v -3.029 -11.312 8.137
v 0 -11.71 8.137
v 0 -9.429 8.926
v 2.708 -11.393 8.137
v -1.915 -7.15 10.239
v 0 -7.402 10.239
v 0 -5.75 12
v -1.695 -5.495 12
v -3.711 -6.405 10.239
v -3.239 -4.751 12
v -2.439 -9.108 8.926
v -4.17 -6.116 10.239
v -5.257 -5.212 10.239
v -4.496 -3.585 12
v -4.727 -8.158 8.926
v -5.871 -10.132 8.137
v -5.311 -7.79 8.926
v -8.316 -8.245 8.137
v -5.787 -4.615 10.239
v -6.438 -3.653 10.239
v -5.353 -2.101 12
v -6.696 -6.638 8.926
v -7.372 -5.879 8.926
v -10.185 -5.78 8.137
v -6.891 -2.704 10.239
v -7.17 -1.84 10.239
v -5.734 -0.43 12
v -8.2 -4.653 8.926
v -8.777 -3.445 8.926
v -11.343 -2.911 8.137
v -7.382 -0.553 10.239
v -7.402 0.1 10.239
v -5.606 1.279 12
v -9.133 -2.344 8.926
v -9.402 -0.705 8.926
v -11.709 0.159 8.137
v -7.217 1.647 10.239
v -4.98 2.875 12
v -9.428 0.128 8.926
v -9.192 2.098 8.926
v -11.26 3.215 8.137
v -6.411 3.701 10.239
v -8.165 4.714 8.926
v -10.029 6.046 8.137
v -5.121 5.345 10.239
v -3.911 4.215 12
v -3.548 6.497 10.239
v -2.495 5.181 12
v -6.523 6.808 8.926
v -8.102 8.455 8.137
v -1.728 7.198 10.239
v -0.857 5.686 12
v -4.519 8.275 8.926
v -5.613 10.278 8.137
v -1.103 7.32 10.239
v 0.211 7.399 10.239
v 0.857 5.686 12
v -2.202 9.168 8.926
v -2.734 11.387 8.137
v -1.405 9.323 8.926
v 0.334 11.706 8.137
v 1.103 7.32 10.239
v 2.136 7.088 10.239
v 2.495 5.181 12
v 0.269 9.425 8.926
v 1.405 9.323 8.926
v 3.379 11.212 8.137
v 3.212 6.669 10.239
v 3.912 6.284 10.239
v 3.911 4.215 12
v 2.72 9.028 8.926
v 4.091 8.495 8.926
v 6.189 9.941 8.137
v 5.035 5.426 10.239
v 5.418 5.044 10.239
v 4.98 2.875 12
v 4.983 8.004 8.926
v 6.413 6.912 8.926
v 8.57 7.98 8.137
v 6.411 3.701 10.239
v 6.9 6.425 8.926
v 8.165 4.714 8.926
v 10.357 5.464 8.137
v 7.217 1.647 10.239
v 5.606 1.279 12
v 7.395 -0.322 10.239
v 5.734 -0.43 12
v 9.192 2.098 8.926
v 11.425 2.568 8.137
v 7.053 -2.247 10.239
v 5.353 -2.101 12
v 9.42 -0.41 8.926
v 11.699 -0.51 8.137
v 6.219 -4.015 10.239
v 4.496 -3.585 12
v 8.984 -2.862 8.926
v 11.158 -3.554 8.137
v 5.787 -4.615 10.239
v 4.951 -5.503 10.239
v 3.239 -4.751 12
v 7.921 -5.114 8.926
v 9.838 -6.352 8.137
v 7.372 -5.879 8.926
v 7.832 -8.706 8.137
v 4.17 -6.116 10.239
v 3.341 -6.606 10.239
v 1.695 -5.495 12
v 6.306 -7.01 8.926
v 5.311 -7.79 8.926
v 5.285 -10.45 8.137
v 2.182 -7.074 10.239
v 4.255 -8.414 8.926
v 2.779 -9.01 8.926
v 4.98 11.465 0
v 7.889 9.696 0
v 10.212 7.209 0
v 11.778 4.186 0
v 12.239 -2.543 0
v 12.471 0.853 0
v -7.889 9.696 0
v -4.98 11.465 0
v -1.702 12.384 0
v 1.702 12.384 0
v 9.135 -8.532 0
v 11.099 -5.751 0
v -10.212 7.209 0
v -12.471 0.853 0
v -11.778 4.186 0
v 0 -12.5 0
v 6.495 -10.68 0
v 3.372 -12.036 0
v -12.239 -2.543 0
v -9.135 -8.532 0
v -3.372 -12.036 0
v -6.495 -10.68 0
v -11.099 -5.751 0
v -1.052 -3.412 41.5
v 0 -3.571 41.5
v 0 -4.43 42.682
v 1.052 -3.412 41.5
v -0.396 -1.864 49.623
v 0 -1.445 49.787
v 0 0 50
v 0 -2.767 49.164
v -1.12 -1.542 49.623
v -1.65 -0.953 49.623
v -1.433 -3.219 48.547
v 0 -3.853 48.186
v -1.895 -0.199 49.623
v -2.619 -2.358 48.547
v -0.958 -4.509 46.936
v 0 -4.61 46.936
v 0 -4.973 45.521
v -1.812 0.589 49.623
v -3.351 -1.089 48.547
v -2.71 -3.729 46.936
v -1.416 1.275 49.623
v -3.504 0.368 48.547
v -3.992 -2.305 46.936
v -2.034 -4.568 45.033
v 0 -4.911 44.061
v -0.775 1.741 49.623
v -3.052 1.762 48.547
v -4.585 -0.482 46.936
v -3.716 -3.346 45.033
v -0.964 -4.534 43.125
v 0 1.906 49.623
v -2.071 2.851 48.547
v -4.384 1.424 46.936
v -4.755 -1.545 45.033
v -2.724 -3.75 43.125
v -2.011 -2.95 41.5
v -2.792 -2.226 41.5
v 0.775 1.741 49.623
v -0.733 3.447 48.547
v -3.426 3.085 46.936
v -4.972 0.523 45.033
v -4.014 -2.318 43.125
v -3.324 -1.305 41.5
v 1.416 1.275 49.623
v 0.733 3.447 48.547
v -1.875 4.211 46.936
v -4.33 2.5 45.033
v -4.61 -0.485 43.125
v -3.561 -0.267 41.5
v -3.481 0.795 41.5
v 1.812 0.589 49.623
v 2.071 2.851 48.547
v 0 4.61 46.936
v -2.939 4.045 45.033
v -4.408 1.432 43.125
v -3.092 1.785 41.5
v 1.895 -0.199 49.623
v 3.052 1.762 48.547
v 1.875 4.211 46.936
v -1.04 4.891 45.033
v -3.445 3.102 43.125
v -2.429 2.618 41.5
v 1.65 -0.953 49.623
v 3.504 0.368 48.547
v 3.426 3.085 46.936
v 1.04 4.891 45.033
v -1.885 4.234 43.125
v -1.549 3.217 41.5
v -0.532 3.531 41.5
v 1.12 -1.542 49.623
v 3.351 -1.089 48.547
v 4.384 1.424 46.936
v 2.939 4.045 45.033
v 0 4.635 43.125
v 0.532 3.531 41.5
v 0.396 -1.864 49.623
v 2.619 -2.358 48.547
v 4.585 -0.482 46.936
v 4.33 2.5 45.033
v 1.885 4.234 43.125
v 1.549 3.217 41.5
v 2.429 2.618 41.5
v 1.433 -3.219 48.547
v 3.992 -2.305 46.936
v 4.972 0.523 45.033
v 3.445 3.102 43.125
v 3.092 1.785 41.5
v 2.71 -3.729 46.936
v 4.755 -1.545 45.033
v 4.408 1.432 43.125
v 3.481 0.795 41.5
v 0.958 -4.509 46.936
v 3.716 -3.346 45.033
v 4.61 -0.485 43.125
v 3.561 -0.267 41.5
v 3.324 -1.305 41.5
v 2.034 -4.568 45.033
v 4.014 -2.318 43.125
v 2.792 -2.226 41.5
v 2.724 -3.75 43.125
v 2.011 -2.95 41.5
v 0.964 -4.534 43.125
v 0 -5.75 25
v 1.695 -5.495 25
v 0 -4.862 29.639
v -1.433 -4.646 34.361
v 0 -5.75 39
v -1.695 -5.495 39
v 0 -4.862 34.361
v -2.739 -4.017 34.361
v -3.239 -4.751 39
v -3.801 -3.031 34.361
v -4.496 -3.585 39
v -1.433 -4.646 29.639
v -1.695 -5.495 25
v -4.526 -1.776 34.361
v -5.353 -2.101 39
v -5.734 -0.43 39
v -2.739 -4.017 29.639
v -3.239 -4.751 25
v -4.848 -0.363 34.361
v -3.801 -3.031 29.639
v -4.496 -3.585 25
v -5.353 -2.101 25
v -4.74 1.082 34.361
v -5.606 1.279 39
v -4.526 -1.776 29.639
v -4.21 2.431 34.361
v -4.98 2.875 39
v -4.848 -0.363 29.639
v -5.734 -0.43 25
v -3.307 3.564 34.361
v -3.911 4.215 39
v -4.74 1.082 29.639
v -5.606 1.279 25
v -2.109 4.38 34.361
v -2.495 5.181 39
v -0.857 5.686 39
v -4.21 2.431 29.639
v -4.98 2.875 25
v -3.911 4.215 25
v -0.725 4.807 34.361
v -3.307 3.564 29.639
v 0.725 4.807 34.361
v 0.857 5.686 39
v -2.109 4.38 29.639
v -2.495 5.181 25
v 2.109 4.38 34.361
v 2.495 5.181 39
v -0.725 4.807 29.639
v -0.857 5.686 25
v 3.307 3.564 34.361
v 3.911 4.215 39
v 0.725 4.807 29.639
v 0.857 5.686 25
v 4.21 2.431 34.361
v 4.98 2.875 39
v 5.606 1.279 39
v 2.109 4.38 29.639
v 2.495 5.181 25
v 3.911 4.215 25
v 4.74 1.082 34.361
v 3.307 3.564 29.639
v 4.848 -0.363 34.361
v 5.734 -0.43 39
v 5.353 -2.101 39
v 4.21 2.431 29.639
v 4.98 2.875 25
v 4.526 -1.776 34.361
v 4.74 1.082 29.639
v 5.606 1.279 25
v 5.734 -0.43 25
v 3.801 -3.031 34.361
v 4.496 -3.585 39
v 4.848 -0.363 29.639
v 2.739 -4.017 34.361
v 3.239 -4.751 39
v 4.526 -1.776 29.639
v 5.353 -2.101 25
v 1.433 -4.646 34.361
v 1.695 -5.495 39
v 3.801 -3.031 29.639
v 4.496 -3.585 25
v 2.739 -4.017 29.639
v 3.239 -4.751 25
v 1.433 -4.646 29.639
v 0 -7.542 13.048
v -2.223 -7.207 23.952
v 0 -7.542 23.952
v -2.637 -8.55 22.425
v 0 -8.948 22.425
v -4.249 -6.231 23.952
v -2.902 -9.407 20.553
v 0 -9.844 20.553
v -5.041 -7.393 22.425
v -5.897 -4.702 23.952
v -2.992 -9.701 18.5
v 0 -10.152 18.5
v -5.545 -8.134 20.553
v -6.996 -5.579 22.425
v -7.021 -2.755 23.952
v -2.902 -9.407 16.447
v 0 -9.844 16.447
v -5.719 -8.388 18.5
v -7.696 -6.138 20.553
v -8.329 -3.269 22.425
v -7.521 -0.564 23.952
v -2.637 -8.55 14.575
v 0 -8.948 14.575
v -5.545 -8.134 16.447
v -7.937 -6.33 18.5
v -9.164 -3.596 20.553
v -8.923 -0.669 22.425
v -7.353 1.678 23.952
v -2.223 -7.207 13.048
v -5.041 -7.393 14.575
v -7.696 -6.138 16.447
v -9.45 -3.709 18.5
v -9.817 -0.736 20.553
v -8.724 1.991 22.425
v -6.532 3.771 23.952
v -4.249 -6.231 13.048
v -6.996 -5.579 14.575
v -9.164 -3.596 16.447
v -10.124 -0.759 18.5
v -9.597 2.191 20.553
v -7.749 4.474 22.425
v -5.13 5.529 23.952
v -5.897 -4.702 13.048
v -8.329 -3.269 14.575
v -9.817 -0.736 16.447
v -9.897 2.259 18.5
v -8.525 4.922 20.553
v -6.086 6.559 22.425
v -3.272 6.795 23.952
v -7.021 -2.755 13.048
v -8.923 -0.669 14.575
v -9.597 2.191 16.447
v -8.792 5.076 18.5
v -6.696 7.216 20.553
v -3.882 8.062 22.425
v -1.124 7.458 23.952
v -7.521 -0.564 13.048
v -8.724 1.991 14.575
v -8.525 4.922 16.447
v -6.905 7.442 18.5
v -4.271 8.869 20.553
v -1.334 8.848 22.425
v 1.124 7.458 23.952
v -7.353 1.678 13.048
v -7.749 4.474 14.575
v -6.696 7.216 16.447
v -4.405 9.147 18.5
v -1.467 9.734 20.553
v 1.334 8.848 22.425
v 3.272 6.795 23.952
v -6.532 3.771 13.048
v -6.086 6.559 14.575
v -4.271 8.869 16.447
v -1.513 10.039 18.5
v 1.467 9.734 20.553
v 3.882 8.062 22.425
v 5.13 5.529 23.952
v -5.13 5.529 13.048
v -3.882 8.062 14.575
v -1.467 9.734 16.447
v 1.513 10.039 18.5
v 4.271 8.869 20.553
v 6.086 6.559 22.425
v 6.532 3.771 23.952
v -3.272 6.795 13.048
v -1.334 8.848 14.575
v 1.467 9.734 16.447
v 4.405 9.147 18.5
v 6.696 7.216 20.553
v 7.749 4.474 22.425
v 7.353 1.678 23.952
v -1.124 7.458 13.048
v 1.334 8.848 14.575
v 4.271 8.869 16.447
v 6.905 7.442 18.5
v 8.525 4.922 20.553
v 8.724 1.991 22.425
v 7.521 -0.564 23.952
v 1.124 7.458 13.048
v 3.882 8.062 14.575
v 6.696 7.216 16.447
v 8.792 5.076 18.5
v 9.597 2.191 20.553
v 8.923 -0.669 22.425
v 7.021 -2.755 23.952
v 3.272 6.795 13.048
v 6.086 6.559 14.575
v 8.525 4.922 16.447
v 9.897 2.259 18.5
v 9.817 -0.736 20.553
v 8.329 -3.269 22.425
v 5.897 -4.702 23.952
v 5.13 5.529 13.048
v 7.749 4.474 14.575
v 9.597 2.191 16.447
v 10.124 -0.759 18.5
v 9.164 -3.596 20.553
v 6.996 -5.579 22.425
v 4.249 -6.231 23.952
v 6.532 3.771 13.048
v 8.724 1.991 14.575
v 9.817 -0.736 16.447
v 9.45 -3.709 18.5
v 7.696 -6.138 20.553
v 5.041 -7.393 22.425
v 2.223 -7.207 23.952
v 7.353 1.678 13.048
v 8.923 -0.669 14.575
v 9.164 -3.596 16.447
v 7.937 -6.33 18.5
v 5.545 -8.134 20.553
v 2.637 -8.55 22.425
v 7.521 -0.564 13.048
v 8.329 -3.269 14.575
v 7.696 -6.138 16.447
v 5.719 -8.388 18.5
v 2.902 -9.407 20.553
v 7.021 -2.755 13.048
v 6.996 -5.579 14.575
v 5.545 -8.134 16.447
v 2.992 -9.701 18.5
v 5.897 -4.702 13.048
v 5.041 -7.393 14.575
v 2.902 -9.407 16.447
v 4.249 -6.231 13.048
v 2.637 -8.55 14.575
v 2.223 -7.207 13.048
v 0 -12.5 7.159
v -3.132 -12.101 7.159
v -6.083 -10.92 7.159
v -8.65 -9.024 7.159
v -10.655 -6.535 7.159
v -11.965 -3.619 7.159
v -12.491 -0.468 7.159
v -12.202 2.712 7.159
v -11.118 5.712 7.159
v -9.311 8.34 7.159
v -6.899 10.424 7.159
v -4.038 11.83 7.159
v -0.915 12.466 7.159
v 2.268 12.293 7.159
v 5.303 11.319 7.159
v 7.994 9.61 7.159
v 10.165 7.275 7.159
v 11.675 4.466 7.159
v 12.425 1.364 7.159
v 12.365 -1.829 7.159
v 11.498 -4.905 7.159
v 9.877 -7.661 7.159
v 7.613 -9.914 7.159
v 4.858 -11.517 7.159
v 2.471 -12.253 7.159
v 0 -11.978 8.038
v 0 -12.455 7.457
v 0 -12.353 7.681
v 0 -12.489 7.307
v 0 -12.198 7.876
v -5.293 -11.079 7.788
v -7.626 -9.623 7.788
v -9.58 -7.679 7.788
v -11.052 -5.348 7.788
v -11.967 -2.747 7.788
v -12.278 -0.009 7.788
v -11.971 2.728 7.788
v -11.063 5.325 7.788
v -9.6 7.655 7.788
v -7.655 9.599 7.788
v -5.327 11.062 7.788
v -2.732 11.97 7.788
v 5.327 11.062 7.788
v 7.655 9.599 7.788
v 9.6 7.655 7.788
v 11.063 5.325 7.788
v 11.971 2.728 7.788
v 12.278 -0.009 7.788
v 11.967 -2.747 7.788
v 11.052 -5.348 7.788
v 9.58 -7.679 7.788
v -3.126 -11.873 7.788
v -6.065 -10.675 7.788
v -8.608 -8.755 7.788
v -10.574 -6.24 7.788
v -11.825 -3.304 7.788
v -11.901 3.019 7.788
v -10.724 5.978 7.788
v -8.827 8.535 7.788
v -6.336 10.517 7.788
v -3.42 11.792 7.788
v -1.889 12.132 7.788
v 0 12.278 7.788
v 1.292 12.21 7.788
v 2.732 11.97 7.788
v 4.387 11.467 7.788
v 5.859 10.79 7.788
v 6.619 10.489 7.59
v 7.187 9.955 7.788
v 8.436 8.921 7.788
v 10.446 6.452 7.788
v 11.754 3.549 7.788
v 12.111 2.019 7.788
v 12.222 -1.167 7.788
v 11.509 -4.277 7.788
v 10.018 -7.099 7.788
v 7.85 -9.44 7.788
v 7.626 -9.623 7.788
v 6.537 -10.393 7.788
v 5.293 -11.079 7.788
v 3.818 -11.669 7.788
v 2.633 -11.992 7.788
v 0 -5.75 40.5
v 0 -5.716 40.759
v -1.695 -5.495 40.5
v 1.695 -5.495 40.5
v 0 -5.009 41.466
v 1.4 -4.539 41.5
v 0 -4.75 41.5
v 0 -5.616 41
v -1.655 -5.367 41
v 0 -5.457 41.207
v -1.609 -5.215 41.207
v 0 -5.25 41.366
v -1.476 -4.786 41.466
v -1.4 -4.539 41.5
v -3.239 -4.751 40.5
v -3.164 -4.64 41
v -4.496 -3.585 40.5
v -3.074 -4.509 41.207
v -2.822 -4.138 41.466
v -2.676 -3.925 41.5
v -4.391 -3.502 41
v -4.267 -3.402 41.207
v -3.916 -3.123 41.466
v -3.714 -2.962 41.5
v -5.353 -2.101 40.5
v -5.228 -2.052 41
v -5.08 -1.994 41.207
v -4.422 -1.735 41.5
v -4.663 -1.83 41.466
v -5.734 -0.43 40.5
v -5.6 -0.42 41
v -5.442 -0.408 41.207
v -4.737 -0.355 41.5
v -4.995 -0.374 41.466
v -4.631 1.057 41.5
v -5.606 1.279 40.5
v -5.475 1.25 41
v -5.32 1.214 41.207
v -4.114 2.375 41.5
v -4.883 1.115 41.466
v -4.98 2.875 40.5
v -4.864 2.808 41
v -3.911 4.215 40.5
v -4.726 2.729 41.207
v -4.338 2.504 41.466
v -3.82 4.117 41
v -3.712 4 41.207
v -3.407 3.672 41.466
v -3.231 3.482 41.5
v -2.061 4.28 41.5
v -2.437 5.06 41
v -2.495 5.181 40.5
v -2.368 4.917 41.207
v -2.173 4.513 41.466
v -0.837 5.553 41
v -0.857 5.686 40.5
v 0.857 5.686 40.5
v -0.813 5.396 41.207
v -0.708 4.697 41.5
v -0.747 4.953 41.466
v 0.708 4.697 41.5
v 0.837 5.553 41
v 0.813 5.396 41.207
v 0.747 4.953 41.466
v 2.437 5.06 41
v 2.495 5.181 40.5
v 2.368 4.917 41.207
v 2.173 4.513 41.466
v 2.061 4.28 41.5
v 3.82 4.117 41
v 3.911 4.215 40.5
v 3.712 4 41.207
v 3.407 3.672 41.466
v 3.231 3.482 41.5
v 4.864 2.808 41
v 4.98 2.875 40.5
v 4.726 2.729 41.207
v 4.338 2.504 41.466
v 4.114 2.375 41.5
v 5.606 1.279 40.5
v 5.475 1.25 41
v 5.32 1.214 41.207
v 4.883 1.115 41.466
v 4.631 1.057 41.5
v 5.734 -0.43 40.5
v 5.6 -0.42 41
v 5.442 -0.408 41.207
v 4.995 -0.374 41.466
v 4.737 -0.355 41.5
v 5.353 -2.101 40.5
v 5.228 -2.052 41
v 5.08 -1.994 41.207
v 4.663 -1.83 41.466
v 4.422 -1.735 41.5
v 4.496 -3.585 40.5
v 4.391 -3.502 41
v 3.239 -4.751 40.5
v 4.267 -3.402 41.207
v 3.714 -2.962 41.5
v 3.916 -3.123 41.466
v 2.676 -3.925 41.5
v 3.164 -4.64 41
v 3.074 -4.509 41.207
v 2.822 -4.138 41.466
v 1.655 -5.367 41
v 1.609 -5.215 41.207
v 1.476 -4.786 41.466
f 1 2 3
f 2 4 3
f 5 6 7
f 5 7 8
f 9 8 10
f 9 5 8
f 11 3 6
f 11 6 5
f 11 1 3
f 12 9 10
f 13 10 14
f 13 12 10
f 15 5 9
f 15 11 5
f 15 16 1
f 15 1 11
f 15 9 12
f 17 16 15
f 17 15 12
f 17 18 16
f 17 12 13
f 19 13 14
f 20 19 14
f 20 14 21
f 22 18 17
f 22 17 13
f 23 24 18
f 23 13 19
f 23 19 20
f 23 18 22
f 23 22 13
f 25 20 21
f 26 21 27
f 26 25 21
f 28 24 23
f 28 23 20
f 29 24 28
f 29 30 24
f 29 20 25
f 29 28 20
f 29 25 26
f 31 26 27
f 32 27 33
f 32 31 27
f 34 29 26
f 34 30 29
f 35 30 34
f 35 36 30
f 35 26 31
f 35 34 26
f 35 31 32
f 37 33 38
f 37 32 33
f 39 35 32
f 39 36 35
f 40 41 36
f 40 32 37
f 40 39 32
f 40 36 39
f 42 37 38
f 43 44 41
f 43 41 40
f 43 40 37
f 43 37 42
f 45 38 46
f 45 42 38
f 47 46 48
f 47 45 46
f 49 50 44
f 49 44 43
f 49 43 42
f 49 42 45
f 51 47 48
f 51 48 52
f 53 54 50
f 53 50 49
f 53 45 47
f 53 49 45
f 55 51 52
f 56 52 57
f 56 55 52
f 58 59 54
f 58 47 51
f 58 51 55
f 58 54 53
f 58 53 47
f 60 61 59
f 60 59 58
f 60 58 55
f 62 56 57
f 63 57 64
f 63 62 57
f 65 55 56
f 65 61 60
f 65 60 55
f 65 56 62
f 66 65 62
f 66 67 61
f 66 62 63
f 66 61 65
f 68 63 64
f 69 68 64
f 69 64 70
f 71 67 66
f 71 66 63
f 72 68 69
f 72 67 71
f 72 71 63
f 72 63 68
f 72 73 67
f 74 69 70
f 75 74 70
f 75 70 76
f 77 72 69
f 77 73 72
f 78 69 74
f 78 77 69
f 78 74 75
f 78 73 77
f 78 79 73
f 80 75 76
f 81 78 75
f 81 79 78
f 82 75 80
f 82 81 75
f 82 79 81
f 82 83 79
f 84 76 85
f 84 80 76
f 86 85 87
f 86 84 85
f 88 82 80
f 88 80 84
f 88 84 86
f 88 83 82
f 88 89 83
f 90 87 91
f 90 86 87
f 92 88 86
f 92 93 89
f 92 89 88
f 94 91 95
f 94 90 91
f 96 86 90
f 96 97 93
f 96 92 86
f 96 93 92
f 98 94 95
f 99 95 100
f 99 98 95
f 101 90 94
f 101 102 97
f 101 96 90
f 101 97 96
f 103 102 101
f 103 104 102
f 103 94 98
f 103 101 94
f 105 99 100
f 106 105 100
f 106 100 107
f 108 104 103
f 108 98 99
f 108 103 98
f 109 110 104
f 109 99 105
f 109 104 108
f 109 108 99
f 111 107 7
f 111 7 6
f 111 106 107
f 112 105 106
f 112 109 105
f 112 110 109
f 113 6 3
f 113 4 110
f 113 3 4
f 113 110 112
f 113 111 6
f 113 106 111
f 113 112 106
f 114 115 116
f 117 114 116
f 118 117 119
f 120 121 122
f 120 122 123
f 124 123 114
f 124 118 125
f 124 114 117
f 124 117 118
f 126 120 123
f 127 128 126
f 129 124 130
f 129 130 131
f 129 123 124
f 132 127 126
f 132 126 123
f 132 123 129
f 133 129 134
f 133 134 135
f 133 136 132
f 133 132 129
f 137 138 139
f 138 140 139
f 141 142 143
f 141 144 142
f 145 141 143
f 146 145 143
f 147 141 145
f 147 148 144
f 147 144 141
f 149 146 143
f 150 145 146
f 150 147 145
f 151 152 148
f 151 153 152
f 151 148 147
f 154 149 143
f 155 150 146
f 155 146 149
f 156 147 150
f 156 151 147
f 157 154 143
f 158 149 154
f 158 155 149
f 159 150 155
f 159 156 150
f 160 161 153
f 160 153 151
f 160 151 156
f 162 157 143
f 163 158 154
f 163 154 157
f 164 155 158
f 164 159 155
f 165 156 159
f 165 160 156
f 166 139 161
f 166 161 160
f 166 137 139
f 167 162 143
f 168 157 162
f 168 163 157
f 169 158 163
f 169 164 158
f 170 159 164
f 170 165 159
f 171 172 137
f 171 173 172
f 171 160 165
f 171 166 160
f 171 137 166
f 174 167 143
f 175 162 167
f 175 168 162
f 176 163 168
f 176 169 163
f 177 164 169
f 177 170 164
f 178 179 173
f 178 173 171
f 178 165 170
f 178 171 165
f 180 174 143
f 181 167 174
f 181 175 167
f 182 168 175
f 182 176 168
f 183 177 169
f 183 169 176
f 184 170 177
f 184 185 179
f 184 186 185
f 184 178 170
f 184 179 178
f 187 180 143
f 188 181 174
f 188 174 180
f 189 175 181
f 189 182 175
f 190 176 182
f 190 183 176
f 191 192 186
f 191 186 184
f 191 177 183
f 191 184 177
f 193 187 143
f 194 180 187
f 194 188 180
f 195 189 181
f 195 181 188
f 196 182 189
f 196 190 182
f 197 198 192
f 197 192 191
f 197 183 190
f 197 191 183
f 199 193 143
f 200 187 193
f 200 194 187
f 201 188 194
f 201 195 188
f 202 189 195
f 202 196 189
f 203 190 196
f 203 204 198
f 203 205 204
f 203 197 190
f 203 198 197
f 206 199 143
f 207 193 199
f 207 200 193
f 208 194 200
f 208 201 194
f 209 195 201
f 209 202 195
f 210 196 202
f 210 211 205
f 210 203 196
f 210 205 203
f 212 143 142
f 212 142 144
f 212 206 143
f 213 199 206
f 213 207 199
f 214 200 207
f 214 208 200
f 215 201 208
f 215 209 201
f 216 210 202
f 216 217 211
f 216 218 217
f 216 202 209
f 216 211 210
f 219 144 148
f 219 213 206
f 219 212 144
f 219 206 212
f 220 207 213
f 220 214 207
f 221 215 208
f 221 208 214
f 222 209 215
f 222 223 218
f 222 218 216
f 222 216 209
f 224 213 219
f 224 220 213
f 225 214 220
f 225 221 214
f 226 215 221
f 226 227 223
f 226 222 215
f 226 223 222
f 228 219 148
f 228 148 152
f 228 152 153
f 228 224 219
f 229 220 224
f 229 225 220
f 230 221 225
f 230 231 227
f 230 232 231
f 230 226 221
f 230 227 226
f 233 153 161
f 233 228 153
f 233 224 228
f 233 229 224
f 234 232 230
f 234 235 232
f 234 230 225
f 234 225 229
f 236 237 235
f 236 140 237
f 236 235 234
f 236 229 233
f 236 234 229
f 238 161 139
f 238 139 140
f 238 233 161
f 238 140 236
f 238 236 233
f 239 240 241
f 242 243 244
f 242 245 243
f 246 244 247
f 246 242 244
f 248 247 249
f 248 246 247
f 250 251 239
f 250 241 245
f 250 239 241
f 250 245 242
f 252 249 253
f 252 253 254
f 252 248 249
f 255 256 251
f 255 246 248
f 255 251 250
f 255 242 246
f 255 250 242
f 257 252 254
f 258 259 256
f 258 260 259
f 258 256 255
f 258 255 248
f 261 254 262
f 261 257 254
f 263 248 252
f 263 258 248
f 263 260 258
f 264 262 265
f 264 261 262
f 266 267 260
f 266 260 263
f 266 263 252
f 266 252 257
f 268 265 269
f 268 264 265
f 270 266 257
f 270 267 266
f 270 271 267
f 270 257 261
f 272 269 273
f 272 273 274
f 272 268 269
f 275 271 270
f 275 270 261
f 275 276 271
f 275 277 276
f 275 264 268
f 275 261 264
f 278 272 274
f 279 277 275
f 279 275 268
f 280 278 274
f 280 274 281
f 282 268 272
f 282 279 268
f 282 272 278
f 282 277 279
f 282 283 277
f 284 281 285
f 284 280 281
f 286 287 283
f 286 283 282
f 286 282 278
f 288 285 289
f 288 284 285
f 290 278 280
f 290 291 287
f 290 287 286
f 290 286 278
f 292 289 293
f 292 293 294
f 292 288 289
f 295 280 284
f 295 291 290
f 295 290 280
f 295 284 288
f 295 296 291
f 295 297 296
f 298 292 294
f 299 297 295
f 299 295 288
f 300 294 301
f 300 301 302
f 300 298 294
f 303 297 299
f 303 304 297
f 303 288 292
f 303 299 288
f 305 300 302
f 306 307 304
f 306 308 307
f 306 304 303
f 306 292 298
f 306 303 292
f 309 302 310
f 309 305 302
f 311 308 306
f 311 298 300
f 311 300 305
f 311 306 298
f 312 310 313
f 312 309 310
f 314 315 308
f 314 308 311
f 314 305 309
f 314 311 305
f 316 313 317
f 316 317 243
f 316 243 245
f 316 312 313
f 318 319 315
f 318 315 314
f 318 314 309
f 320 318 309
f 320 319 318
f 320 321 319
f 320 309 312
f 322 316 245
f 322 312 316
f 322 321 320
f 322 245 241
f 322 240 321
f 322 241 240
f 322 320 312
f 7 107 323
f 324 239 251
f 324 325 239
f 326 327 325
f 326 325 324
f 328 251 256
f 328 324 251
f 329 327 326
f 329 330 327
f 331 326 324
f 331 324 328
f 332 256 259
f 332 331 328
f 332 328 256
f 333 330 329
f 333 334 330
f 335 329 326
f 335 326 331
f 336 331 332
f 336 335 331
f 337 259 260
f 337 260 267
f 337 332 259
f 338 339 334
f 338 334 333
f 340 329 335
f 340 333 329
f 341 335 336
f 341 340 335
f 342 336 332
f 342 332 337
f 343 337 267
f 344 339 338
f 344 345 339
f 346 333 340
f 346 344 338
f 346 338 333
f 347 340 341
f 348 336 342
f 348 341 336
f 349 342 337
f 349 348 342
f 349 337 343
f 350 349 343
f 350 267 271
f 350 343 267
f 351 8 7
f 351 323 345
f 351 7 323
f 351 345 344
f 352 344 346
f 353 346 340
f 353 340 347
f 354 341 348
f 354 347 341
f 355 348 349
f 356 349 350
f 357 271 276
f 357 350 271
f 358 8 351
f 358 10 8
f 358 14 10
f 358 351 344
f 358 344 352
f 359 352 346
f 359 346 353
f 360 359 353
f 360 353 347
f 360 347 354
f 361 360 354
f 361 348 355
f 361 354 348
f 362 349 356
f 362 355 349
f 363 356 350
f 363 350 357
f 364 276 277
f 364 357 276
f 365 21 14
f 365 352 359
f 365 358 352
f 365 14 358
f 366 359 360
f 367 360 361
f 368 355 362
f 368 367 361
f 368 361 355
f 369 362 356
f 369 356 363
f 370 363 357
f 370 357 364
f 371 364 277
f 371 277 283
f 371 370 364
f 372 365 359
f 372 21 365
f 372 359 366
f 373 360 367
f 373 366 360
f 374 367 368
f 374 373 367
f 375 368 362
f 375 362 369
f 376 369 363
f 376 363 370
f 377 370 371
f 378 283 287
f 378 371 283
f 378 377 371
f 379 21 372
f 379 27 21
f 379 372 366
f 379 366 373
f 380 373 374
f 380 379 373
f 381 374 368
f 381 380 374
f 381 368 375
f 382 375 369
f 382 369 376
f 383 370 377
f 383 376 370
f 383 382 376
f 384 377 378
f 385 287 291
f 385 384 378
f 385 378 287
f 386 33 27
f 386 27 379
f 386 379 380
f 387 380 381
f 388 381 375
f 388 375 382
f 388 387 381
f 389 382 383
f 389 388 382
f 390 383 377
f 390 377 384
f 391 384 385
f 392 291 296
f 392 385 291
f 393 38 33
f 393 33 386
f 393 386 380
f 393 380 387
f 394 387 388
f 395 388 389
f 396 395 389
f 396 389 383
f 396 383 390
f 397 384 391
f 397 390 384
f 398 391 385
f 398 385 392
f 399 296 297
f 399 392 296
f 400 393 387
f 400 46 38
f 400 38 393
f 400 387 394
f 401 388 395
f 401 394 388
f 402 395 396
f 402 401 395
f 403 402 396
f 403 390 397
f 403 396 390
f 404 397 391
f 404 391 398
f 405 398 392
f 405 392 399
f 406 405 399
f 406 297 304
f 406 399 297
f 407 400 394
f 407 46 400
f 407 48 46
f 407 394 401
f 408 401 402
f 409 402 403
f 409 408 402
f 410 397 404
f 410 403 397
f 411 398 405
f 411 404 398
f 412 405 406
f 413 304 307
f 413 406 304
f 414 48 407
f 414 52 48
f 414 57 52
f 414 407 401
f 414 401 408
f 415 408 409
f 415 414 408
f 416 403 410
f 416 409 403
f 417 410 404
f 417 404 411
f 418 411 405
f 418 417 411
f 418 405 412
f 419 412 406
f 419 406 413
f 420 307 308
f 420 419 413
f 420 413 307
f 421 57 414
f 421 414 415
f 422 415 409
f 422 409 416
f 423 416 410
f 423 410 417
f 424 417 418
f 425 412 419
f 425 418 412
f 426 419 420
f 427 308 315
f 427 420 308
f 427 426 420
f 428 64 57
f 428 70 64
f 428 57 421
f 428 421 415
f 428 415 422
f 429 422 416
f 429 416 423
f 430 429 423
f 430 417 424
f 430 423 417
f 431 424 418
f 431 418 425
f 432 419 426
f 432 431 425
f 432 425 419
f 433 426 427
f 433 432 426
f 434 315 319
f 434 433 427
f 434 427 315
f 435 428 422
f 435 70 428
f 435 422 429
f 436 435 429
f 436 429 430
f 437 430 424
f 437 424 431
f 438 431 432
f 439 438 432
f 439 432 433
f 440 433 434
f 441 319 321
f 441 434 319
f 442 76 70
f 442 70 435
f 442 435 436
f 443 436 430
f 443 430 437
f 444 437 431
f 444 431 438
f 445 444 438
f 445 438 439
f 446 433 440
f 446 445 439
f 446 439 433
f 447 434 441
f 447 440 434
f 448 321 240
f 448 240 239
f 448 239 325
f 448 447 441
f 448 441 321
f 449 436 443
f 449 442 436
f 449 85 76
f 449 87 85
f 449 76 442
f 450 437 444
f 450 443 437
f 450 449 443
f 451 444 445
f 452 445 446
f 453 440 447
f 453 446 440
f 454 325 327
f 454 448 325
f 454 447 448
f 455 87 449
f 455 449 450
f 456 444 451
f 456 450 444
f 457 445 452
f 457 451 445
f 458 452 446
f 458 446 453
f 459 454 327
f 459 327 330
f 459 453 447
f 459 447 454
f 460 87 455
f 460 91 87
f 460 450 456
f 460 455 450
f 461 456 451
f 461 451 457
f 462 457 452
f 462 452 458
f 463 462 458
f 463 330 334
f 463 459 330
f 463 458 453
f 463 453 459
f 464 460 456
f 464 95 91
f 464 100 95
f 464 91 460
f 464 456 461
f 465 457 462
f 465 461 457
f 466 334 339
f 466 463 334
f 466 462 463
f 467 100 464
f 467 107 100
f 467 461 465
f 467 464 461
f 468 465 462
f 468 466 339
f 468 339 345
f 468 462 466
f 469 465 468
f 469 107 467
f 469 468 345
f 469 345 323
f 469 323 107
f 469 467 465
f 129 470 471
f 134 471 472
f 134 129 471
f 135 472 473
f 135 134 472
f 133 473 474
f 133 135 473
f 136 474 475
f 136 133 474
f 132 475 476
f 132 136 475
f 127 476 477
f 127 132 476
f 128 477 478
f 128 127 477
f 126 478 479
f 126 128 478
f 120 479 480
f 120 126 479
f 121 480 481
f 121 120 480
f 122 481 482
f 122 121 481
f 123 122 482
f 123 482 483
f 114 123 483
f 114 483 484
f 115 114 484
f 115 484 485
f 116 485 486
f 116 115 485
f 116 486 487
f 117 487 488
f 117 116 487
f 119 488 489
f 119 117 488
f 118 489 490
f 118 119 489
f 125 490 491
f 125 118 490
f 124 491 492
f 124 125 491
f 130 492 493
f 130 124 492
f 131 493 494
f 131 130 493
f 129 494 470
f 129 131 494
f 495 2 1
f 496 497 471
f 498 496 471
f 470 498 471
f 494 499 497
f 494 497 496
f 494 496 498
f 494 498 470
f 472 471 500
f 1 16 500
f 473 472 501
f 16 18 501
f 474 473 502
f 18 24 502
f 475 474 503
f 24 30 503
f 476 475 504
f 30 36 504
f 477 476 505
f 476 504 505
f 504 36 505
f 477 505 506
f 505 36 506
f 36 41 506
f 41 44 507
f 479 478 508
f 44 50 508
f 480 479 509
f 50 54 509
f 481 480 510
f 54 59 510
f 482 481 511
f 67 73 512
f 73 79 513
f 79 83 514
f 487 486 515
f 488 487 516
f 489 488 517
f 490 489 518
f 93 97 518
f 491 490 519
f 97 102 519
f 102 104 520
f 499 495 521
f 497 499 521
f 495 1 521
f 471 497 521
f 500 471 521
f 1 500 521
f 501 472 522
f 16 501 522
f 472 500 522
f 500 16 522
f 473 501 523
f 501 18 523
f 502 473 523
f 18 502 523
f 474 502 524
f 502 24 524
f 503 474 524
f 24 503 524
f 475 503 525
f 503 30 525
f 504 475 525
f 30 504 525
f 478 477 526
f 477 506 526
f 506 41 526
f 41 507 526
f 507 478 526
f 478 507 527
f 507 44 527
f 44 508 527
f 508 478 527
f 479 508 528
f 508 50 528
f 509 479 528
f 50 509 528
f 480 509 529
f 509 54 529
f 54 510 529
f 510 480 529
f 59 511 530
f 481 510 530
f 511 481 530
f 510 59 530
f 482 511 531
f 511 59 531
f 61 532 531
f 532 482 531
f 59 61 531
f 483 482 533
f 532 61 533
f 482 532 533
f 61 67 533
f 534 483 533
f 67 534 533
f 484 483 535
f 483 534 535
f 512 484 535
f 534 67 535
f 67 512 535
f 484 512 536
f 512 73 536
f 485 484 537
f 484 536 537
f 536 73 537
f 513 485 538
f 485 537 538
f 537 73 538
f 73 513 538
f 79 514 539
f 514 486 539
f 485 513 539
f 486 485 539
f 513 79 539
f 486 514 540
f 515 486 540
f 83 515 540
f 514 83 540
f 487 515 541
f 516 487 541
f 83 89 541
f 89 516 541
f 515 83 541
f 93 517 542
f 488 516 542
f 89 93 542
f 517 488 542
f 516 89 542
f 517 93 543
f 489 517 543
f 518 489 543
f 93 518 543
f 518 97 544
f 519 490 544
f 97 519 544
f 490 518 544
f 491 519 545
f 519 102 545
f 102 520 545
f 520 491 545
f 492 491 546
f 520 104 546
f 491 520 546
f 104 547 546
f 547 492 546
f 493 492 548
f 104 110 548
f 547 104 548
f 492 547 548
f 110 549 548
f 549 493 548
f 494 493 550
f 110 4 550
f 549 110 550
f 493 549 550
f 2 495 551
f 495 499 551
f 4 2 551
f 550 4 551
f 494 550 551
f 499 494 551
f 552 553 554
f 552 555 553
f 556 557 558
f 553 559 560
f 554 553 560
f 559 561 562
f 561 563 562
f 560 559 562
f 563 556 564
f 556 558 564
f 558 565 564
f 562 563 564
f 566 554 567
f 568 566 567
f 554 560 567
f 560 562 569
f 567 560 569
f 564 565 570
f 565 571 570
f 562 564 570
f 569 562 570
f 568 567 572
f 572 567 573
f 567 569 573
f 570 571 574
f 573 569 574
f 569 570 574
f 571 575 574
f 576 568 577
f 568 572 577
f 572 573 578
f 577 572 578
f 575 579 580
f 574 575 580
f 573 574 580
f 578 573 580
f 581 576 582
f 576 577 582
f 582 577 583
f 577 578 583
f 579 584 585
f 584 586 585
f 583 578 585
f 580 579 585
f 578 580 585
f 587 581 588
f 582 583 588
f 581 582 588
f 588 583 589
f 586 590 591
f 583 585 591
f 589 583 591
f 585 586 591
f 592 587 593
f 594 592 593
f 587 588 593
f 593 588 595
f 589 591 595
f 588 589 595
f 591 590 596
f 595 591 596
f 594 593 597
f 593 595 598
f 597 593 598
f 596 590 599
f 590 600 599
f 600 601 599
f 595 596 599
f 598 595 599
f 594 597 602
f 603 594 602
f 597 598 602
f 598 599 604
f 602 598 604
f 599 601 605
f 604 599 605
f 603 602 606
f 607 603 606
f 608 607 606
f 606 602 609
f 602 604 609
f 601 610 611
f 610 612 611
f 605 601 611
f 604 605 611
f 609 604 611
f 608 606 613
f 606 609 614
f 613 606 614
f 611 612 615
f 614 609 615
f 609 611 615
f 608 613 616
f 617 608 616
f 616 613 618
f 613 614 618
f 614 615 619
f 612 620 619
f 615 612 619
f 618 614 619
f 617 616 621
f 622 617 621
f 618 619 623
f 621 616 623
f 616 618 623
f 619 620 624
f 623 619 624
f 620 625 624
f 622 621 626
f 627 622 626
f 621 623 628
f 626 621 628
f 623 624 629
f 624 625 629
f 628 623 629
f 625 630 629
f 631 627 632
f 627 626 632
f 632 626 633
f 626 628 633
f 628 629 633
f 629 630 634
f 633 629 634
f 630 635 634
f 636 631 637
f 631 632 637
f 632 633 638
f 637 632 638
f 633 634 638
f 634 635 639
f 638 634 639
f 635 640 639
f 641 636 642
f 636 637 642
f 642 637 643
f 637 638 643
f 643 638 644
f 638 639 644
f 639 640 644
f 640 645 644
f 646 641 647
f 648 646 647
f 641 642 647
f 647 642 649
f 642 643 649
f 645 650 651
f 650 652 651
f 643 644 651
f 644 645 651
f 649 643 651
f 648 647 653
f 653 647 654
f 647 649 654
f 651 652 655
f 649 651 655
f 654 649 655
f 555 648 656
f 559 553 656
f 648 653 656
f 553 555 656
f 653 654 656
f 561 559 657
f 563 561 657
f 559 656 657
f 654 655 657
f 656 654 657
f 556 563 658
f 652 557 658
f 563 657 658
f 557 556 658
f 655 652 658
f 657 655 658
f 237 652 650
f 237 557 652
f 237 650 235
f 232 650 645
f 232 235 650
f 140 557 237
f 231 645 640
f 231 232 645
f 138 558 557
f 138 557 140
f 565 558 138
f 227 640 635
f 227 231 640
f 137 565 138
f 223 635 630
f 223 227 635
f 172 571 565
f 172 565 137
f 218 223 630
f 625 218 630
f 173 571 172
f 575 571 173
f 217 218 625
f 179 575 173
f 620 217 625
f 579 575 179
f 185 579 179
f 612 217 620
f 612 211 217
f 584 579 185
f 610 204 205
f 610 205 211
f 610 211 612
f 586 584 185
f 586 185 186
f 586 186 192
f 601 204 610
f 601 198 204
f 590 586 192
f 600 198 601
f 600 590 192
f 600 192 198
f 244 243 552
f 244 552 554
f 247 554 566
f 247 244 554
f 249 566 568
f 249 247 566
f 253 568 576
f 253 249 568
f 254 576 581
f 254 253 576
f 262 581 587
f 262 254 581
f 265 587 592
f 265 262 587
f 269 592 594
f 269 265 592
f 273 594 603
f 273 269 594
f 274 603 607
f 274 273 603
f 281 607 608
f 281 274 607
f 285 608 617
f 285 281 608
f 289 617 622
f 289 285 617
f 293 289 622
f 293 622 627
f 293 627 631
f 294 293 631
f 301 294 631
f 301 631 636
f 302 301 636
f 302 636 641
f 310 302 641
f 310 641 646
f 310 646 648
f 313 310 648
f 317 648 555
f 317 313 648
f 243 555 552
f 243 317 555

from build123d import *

# Parameters (mm, degrees)
F2_R = 1
F3_R = 1


with BuildPart() as f1:
    # F0 (on Right) → F1 (revolve)
    with BuildSketch(Plane.YZ):
        with BuildLine():
            Line((-12.5, 0), (0, 0))
            Line((0, 0), (0, 50))
            ThreePointArc((0, 50), (-4.609772, 46.936492), (-3.570714, 41.5))
            Line((-3.570714, 41.5), (-5.75, 41.5))
            Line((-5.75, 41.5), (-5.75, 39))
            ThreePointArc((-5.75, 39), (-4.75, 32), (-5.75, 25))
            ThreePointArc((-5.75, 25), (-10.151924, 18.5), (-5.75, 12))
            ThreePointArc((-5.75, 12), (-8.716309, 9.310335), (-12.5, 8))
            Line((-12.5, 8), (-12.5, 0))
        make_face()
    revolve(axis=Axis((0, 0, 25), (0, 0, -1)))

    # F2
    f2_edges = [f1.edges().sort_by_distance(p)[0] for p in [
        (0, 12.5, 8),
    ]]
    fillet(f2_edges, radius=F2_R)

    # F3
    f3_edges = [f1.edges().sort_by_distance(p)[0] for p in [
        (0, 5.75, 41.5),
    ]]
    fillet(f3_edges, radius=F3_R)


solid = f1.part
